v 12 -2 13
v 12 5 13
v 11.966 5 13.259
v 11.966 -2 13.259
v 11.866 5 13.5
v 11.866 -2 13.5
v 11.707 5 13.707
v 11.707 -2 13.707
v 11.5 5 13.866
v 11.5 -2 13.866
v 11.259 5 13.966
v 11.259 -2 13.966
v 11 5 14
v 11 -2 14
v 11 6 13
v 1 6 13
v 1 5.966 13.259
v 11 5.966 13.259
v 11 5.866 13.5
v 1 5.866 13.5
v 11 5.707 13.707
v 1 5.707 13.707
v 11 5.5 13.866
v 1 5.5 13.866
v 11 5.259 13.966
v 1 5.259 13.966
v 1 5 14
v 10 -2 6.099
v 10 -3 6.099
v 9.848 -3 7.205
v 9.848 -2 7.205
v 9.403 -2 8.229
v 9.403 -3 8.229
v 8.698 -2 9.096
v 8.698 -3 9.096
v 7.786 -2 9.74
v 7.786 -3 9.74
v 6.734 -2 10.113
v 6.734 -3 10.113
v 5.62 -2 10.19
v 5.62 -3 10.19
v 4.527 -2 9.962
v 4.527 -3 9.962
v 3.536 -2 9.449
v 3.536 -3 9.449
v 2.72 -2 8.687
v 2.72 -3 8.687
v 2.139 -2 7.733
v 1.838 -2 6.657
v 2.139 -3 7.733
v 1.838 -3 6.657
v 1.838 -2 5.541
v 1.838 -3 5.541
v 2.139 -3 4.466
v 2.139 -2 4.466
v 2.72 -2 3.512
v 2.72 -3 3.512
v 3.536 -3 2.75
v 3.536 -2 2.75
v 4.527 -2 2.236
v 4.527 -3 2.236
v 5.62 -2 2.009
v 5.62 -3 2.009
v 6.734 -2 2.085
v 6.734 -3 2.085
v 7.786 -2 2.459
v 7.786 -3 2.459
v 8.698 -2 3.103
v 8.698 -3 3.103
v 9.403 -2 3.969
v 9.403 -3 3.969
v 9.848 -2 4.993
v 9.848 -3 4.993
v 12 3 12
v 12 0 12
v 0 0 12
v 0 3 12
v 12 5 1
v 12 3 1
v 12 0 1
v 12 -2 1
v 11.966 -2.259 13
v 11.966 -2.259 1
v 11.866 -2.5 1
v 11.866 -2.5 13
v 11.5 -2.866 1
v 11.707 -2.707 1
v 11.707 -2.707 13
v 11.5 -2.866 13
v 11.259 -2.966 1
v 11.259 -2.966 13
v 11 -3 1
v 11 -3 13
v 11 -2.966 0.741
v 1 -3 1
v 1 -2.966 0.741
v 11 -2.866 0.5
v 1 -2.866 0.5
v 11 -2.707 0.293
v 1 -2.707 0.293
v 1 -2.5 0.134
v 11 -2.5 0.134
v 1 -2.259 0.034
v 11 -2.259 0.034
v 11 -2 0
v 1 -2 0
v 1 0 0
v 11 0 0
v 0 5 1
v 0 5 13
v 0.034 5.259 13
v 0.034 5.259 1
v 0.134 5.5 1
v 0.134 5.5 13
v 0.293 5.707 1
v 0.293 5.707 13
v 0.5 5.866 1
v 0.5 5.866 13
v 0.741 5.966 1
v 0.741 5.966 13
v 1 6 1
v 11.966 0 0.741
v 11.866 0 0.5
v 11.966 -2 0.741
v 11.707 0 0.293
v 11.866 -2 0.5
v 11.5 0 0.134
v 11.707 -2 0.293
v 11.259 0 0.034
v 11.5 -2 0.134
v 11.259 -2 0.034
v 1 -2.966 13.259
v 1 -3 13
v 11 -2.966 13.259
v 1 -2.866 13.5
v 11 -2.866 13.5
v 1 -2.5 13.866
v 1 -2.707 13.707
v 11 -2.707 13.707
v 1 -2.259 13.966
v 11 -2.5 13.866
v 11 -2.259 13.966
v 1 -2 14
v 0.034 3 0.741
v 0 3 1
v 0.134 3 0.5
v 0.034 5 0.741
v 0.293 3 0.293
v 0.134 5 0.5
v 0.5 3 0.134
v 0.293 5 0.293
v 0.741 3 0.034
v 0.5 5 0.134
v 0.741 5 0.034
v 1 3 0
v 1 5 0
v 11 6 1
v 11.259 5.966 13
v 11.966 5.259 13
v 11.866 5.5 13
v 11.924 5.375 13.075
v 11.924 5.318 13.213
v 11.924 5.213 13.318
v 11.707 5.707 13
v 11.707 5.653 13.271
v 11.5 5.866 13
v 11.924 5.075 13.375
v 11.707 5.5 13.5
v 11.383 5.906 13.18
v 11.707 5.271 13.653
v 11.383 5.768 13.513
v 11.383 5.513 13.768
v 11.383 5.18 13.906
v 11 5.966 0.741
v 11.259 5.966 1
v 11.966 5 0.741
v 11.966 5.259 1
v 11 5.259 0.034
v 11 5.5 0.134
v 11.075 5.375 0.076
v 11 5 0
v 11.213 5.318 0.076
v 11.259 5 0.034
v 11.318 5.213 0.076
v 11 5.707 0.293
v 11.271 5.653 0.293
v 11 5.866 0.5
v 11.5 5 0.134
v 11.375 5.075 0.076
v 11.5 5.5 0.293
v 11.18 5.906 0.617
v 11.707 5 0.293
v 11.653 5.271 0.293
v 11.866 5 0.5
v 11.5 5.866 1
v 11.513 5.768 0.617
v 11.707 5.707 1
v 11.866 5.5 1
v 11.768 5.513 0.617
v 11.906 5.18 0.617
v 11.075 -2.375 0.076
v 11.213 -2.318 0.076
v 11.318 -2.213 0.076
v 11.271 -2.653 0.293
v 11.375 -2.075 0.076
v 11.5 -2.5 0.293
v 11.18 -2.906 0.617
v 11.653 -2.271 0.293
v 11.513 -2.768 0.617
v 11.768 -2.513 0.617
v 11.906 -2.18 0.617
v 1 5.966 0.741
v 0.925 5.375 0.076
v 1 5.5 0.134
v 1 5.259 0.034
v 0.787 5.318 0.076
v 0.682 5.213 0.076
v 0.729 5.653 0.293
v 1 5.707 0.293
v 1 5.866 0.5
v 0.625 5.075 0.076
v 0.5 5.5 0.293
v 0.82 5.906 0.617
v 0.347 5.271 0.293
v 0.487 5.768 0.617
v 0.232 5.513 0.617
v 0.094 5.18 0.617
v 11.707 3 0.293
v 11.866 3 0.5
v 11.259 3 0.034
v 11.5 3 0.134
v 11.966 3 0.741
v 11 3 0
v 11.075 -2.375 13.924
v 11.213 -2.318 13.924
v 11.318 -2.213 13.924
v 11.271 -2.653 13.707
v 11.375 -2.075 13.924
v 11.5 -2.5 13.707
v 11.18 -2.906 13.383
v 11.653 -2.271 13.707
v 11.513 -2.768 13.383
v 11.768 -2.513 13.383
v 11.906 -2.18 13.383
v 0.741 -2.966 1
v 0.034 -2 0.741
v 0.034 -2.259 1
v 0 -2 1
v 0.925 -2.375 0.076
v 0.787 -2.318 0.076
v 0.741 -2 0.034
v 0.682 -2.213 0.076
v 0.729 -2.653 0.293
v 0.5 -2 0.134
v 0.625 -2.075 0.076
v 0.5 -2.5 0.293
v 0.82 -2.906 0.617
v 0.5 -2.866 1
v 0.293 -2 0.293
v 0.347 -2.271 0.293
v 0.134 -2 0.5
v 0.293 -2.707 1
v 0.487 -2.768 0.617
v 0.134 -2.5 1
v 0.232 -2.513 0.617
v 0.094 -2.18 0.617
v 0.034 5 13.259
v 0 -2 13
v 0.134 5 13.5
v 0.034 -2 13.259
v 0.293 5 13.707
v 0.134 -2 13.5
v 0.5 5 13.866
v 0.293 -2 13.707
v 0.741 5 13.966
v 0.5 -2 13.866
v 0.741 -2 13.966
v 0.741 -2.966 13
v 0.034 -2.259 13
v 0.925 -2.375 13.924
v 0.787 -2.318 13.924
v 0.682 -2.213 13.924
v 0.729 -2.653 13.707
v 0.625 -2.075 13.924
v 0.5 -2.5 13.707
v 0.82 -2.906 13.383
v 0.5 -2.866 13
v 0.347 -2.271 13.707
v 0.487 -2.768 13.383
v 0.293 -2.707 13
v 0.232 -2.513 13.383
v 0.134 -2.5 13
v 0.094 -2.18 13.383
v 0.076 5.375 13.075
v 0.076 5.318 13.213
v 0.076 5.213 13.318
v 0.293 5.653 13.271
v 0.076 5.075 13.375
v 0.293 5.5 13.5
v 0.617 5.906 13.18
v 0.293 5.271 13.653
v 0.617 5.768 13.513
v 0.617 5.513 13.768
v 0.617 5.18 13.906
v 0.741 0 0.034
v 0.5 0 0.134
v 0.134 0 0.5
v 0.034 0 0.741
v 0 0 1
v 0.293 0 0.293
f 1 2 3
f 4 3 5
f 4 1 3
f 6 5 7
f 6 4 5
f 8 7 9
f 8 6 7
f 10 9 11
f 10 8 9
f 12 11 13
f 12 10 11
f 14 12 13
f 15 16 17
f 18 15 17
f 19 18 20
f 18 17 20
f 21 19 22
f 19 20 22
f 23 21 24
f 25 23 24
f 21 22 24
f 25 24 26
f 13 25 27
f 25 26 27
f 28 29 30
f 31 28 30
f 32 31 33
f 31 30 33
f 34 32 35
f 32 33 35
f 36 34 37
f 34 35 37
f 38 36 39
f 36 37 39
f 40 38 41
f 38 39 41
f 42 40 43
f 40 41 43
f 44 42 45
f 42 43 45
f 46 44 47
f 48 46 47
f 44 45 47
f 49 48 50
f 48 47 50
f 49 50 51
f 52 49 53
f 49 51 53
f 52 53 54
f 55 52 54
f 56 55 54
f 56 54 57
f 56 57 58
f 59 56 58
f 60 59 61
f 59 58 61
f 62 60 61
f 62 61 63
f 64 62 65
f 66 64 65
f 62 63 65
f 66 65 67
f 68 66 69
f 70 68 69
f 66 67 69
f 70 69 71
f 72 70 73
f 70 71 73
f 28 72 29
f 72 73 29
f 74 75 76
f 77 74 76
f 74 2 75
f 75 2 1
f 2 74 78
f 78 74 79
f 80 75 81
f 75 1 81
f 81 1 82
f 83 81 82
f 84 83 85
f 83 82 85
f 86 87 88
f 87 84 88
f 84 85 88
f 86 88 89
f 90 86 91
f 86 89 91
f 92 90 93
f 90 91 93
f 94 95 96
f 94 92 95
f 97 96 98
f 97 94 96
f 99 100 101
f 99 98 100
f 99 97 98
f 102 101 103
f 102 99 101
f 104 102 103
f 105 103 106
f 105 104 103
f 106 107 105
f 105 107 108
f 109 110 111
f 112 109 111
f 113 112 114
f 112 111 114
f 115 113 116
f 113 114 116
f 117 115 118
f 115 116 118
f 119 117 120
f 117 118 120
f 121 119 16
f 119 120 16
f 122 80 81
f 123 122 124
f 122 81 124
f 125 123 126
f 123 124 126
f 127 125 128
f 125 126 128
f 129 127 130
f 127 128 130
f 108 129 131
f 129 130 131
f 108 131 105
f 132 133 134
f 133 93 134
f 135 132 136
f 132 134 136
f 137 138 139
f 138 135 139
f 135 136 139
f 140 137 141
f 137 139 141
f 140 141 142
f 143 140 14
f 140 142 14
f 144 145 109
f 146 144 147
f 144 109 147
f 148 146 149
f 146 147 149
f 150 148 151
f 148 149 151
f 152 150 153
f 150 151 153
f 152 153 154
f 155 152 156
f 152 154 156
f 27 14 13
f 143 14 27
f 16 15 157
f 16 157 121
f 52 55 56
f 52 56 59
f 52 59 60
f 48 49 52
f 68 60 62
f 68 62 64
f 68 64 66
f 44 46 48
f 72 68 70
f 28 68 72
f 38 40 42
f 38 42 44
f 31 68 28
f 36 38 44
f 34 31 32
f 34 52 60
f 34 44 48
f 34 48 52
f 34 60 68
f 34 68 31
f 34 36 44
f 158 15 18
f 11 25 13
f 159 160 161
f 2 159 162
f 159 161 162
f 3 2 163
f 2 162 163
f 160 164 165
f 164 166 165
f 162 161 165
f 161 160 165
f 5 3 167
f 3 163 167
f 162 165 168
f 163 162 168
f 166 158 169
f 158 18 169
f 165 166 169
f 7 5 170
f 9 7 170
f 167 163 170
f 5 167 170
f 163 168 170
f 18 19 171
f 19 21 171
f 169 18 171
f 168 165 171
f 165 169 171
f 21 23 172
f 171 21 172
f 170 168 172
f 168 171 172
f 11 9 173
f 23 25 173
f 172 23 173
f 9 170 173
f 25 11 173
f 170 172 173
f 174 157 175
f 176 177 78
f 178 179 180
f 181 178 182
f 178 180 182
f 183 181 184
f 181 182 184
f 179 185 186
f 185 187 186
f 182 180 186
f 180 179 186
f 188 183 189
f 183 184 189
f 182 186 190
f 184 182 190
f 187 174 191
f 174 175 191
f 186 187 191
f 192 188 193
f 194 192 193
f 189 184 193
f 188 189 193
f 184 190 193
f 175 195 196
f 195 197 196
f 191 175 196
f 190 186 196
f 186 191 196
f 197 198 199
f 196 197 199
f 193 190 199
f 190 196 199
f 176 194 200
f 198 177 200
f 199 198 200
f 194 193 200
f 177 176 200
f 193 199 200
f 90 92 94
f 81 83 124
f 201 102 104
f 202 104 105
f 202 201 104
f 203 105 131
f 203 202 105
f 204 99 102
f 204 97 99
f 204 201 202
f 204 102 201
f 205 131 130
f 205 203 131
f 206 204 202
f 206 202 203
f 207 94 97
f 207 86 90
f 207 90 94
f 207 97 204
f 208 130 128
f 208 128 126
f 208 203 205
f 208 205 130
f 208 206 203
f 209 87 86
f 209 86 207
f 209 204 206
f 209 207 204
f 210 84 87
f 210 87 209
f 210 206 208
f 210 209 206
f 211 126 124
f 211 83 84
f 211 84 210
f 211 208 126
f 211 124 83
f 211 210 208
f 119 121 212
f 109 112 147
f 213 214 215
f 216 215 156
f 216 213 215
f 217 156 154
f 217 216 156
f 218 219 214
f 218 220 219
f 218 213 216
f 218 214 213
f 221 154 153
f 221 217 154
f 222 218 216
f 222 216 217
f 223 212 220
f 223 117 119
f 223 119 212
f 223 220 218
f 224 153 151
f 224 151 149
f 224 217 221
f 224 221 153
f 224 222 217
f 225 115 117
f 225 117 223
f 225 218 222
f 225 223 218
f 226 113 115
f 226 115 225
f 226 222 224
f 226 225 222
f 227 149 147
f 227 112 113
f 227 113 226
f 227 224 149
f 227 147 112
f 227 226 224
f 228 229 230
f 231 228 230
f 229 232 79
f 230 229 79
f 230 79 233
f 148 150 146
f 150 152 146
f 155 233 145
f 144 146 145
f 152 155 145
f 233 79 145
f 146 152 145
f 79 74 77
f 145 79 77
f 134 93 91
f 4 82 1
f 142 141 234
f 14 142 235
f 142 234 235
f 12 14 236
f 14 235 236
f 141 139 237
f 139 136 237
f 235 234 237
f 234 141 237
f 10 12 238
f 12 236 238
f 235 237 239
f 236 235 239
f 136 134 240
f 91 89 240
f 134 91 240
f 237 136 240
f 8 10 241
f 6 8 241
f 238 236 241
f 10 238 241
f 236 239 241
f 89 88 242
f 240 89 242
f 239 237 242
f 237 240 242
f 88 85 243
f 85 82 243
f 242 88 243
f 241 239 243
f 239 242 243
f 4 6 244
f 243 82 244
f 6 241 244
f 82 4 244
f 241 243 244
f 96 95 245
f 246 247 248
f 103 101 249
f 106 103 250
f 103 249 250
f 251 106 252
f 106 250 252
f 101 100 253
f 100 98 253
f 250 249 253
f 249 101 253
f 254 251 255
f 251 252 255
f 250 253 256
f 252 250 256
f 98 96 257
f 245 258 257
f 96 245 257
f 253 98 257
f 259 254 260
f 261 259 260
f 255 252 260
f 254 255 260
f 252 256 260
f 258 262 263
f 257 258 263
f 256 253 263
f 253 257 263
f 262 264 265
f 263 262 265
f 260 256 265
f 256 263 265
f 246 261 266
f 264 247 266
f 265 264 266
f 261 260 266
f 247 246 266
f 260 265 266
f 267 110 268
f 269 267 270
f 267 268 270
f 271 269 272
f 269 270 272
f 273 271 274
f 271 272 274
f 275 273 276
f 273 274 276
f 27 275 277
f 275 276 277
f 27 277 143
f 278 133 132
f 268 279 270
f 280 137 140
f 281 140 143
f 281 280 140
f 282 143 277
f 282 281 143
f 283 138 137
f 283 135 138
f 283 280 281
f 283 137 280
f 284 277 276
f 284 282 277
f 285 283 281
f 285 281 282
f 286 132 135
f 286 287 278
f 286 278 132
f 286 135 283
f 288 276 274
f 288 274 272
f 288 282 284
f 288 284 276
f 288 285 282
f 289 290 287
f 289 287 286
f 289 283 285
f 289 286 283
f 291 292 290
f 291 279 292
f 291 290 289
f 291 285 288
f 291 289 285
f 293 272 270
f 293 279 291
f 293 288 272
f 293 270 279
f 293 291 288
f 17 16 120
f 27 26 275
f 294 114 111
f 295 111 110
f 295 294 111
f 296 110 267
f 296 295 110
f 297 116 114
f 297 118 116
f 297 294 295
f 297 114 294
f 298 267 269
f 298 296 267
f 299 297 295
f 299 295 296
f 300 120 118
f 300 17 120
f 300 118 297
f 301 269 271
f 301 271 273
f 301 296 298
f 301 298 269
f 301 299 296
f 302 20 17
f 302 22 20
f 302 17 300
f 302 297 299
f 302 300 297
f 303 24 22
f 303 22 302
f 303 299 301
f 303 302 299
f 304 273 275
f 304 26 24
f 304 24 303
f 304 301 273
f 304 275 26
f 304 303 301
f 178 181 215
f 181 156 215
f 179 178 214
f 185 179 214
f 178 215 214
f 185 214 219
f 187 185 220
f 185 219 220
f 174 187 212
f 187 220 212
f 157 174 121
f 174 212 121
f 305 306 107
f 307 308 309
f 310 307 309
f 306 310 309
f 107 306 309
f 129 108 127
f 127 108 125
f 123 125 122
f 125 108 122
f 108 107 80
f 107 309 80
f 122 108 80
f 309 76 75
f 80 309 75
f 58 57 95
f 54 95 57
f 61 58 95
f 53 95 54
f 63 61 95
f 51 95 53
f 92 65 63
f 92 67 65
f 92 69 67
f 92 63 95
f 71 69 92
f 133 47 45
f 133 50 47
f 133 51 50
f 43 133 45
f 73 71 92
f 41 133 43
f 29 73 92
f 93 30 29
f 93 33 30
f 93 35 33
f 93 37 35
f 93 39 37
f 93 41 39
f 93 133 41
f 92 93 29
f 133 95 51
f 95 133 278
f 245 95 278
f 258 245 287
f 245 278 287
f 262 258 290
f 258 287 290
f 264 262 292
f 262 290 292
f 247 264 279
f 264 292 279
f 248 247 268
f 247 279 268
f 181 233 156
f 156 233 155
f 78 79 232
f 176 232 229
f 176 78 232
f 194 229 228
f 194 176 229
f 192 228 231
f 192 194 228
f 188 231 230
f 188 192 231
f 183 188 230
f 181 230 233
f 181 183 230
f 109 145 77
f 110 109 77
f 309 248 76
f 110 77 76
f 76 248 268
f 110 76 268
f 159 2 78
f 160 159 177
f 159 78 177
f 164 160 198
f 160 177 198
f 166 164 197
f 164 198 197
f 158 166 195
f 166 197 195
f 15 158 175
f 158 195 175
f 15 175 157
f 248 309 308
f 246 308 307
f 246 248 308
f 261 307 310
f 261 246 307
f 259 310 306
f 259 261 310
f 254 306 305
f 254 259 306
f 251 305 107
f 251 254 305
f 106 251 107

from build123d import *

# Parameters (mm, degrees)
F0_W     = 12
F0_H     = 14
F1_DEPTH = 3
F2_R     = 4.1
F3_DEPTH = 1
F4_W     = 12
F4_H     = 2
F5_DEPTH = 3
F6_W     = 12
F6_H     = 2
F6_H_2   = 12
F7_DEPTH = 3
F8_R     = 1


with BuildPart() as f1:
    # F0 (on Front) → F1 (new body)
    with BuildSketch(Plane.XZ):
        with Locations((6, 7)):
            Rectangle(F0_W, F0_H)
    extrude(amount=F1_DEPTH)

    # F2 (on face) → F3 (cut)
    with BuildSketch(Plane.XZ.offset(3)):
        with Locations((5.9, 6.09918)):
            Circle(F2_R)
    extrude(amount=-F3_DEPTH, mode=Mode.SUBTRACT)

    # F4 (on face) → F5 (join)
    with BuildSketch(Plane(origin=(0, 0, 0), x_dir=(-1, 0, 0), z_dir=(0, 1, 0))):
        with Locations((-6, 13)):
            Rectangle(F4_W, F4_H)
    extrude(amount=F5_DEPTH)

    # F6 (on face) → F7 (join)
    with BuildSketch(Plane(origin=(0, 3, 0), x_dir=(-1, 0, 0), z_dir=(0, 1, 0))):
        with Locations((-6, 13)):
            Rectangle(F6_W, F6_H)
        with Locations((-6, 6)):
            Rectangle(F6_W, F6_H_2)
    extrude(amount=F7_DEPTH)

    # F8
    f8_edges = [f1.edges().sort_by_distance(p)[0] for p in [
        (12, -3, 7),
        (0, -3, 7),
        (6, -3, 14),
        (6, -3, 0),
        (6, 6, 14),
        (0, 6, 7),
        (12, 6, 7),
        (6, 6, 0),
        (0, 1.5, 14),
        (12, 1.5, 14),
        (12, -1.5, 0),
        (12, 4.5, 0),
        (0, 4.5, 0),
        (0, -1.5, 0),
    ]]
    fillet(f8_edges, radius=F8_R)


solid = f1.part
